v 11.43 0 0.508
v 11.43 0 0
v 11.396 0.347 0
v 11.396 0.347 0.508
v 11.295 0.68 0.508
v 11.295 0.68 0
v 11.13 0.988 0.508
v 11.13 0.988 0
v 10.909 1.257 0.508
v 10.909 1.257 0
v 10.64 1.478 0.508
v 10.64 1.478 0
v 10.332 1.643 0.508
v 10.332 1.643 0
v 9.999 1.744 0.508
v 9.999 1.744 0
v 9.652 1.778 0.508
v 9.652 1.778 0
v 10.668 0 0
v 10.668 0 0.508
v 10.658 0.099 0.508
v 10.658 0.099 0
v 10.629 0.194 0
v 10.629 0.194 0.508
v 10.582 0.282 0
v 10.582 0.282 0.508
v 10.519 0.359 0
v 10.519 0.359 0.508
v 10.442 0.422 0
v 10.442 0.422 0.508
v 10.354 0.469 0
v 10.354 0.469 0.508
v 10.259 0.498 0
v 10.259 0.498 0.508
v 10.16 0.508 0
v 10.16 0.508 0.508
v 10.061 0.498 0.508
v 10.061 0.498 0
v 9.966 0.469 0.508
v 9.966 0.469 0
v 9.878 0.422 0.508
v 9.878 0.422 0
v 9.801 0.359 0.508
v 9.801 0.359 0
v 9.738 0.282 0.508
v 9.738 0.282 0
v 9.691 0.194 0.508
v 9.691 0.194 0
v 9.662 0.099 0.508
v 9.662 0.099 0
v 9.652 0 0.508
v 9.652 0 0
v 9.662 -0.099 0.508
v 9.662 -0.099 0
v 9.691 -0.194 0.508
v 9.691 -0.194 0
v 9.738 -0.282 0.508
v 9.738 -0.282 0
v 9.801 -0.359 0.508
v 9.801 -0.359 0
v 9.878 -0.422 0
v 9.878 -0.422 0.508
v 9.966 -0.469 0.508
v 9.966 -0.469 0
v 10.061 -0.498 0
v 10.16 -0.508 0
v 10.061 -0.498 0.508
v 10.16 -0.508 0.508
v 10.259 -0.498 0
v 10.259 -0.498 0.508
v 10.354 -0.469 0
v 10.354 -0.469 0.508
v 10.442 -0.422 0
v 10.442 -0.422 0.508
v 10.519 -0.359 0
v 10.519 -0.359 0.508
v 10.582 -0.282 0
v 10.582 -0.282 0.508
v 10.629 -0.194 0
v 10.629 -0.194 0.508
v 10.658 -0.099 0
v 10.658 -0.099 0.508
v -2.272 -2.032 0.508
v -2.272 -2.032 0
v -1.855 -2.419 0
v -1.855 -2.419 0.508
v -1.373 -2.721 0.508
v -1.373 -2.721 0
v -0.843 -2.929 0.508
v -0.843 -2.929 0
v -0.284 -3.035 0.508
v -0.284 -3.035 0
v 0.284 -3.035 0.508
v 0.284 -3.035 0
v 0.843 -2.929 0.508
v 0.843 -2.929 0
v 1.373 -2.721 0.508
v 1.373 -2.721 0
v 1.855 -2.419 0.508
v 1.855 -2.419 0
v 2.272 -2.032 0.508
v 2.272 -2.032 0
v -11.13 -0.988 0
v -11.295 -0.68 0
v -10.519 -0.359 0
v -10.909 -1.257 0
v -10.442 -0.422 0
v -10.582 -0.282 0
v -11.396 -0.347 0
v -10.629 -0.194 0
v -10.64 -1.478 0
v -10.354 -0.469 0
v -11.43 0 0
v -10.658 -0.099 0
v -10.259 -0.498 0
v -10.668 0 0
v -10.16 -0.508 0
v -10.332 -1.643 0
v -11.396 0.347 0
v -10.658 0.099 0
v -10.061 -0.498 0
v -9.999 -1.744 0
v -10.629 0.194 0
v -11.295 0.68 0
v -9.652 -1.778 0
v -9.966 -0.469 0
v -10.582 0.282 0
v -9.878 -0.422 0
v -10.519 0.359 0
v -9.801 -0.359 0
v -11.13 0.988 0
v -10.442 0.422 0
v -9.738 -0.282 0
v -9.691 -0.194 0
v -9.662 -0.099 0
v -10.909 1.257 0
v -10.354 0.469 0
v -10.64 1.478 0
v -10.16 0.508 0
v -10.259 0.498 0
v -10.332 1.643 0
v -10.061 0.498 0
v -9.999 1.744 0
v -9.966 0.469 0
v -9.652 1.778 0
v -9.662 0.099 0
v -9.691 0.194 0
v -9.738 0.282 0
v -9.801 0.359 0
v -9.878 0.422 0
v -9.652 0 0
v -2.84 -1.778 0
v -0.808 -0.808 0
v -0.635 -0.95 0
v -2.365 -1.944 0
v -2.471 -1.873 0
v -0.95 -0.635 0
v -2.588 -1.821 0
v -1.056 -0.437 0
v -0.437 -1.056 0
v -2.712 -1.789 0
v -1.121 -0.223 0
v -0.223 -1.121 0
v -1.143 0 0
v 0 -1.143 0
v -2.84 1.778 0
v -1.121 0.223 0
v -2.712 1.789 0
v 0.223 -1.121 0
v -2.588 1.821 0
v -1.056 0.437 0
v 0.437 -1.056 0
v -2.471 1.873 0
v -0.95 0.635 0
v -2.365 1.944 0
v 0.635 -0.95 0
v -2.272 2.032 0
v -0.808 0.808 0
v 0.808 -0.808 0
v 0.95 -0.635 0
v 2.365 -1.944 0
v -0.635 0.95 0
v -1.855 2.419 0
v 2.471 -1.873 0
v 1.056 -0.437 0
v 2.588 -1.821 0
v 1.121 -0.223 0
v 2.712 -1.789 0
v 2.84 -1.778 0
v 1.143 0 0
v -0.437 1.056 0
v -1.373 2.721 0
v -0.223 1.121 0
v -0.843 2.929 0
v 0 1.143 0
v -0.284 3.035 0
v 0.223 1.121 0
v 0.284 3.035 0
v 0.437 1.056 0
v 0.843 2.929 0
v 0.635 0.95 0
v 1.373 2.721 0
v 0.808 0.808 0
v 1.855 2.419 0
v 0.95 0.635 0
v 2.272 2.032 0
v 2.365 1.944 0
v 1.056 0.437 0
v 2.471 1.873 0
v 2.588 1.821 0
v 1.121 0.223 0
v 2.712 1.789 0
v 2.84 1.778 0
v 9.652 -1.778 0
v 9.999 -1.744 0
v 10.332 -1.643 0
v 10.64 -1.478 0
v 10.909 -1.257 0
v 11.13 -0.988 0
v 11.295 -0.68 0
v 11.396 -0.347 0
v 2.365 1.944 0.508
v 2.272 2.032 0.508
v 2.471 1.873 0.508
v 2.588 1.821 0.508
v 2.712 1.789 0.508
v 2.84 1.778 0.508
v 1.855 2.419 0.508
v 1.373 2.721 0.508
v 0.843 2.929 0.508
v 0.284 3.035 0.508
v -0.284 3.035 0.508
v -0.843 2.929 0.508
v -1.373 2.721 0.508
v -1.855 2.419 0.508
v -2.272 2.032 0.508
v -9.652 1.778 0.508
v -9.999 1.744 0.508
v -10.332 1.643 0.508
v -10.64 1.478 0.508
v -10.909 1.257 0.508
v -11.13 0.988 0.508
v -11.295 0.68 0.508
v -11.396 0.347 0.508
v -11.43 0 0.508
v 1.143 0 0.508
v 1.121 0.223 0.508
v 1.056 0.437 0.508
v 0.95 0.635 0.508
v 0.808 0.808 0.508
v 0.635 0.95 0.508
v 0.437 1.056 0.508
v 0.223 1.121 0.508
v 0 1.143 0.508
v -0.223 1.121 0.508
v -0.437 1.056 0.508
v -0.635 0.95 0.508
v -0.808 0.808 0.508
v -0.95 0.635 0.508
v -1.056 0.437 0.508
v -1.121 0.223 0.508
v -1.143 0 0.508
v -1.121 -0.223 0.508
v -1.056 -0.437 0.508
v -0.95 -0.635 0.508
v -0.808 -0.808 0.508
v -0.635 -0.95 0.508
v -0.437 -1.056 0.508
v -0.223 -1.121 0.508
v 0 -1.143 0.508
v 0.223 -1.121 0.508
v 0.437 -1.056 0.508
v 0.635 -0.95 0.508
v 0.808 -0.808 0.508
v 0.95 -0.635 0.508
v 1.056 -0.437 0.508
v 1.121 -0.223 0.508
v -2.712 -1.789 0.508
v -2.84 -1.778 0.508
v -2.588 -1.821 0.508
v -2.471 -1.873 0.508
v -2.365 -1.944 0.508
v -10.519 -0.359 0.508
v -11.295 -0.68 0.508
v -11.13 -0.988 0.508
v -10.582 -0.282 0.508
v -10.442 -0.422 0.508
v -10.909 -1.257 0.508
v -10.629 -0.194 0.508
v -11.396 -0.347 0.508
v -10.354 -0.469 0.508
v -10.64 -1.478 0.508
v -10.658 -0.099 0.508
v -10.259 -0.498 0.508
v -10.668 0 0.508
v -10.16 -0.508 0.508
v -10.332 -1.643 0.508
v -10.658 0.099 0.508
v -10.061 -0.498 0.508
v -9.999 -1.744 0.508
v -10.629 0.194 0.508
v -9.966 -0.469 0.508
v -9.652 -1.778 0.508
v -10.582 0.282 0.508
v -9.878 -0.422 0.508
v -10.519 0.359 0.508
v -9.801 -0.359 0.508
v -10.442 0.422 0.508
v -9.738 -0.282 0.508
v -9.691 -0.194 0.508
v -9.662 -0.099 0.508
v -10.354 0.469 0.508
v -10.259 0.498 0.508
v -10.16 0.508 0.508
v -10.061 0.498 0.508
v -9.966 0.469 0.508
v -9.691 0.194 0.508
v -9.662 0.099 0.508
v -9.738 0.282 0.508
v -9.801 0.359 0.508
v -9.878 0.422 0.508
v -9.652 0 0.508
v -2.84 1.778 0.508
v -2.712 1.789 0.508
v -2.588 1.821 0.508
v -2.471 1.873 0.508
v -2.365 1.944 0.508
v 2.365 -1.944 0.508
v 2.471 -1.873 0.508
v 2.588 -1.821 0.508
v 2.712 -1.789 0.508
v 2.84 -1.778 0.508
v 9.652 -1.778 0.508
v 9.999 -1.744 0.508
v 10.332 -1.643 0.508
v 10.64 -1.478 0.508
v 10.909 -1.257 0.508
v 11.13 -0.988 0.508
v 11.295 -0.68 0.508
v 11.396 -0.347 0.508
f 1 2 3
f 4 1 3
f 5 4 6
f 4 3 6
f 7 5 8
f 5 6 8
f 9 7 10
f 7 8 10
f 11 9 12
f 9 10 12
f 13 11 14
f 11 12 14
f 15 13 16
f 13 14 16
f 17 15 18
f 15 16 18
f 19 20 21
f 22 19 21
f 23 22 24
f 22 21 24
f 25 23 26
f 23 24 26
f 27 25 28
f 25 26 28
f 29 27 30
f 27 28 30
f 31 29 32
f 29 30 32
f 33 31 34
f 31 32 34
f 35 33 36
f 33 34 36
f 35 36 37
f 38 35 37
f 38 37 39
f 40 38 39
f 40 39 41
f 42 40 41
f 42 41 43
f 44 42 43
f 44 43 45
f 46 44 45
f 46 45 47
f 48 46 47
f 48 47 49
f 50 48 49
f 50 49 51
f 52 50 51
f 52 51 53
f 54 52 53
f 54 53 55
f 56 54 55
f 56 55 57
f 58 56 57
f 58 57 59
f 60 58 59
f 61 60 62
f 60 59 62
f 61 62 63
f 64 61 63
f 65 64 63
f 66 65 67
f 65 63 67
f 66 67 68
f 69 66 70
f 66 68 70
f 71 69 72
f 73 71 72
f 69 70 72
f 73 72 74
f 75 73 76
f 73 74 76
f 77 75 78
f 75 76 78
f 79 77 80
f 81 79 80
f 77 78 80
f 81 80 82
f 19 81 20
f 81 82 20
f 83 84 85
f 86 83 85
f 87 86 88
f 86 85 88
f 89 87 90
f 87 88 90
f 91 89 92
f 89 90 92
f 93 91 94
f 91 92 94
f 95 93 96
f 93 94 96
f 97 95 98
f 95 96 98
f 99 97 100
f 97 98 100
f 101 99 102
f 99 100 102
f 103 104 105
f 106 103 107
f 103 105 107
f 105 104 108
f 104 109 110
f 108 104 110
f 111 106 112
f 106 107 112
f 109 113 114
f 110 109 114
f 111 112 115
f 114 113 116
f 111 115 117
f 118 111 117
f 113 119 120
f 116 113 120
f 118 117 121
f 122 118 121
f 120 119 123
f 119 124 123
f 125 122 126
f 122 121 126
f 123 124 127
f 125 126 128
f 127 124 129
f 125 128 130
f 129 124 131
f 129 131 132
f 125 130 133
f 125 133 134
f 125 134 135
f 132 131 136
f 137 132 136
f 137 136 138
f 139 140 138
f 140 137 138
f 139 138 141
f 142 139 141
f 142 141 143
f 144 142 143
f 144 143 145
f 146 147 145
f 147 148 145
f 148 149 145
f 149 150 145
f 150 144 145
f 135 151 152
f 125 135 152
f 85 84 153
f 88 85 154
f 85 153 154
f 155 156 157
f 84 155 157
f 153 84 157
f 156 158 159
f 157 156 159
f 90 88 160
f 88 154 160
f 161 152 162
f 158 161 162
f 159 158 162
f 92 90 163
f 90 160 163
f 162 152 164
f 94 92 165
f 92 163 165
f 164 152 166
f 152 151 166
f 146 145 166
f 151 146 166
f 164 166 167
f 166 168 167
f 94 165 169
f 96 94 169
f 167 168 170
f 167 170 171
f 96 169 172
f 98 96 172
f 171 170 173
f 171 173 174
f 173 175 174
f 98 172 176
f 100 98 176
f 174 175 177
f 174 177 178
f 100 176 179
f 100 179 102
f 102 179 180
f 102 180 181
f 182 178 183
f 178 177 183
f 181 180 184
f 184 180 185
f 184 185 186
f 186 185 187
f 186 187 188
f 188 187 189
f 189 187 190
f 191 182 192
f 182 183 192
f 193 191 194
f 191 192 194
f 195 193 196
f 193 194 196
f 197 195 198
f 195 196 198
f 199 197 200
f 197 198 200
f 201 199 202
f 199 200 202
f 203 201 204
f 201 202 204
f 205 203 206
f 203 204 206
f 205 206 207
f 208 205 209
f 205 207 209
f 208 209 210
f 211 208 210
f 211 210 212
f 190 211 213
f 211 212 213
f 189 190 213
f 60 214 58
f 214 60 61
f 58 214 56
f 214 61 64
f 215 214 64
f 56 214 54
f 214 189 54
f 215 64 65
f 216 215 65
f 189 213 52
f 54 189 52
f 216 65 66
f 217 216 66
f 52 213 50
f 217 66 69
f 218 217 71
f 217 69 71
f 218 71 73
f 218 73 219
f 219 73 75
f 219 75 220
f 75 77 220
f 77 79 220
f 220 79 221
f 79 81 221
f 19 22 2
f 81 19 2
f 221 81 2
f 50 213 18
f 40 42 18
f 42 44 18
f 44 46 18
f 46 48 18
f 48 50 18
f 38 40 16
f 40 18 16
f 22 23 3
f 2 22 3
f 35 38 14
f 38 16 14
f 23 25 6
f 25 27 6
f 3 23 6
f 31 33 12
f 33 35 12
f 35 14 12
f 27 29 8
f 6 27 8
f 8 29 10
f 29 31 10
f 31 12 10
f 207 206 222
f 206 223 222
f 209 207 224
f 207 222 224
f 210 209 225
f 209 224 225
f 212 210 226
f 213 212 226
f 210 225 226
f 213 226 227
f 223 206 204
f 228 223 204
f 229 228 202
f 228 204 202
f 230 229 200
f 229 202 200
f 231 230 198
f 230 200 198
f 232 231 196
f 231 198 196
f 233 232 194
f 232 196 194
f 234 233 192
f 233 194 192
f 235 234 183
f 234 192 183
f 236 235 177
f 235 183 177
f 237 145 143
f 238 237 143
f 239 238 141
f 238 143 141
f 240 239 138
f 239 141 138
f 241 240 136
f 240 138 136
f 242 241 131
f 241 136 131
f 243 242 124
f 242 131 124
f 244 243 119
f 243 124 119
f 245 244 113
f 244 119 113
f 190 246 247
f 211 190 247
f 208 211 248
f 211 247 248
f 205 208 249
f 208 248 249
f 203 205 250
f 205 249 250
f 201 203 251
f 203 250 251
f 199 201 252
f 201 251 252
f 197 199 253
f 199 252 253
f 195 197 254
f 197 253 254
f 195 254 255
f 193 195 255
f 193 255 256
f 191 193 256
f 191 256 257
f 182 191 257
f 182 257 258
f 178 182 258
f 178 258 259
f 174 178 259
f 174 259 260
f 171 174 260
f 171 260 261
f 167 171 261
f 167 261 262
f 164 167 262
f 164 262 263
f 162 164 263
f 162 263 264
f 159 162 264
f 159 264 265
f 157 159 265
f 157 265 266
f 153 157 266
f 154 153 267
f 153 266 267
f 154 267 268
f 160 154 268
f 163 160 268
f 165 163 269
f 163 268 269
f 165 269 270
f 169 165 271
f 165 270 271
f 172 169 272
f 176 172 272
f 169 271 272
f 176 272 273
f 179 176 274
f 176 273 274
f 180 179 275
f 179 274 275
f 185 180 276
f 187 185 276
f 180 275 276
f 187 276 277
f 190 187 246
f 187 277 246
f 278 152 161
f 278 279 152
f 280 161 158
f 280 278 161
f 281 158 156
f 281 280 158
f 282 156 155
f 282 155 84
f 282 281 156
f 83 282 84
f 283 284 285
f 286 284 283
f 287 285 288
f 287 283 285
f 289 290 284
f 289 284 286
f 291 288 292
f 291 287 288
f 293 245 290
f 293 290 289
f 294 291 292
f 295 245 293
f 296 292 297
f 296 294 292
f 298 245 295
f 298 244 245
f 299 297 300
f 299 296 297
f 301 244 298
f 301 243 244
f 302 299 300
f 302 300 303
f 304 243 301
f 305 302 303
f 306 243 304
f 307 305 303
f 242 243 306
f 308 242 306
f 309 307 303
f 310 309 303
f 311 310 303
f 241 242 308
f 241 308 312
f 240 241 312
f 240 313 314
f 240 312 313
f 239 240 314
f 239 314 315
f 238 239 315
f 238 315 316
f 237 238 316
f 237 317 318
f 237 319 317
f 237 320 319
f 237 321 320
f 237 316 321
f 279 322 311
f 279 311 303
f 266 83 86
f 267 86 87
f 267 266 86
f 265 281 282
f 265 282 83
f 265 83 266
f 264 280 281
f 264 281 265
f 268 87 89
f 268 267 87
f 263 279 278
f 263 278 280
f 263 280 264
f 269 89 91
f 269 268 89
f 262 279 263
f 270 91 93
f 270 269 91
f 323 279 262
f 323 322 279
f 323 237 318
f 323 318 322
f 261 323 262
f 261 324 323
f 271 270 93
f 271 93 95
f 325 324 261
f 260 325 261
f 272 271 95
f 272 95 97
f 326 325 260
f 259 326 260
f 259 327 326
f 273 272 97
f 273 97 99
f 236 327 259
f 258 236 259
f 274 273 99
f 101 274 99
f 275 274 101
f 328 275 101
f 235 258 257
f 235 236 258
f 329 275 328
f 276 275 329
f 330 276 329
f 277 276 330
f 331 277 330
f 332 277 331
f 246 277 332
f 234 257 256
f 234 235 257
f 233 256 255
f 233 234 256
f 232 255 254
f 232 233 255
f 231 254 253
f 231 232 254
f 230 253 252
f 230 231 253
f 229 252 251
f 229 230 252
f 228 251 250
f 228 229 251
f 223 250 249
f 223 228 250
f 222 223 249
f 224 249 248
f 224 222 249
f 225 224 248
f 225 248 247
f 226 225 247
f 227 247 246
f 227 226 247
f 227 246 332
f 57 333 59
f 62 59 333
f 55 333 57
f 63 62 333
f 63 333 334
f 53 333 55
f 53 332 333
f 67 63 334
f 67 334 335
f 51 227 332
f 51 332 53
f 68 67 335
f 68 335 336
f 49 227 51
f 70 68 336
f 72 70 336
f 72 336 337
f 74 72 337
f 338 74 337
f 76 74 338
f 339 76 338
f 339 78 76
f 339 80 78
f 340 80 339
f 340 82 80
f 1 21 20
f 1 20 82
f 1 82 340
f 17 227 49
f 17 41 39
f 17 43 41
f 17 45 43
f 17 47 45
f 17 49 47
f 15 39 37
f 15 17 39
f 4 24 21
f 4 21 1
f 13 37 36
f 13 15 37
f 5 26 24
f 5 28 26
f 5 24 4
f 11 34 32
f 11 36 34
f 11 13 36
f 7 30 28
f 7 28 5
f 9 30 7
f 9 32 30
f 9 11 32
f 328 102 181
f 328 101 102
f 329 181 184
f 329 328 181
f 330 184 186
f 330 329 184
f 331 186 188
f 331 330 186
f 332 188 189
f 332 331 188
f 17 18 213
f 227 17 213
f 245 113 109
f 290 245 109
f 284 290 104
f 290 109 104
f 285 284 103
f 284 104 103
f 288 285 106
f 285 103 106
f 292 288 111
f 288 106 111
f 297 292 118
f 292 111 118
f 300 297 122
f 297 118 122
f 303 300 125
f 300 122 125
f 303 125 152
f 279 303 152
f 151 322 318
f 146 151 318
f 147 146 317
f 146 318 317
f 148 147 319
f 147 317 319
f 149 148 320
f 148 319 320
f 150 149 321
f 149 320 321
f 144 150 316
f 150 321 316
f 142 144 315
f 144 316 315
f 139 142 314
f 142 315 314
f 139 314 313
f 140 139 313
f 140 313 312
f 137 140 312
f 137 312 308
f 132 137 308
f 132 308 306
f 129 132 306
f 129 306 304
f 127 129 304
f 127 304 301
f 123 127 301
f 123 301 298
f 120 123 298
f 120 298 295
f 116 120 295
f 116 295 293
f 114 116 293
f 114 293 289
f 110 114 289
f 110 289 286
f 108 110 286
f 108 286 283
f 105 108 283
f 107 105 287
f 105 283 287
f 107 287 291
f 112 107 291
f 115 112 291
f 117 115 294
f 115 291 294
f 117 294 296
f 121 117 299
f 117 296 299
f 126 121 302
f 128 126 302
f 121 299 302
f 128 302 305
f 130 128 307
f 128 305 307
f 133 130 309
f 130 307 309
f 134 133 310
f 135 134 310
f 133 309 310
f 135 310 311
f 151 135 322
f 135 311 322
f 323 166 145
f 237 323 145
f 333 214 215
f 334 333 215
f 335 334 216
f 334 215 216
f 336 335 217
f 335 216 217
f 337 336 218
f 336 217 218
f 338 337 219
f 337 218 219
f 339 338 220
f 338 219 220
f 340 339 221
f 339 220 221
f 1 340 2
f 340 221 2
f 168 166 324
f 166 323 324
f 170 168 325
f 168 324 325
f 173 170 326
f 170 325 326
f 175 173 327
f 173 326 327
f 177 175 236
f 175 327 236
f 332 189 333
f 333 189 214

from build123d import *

# Parameters (mm, degrees)
F1_DEPTH = 0.508
F2_R     = 0.508
F2_R_2   = 1.143
F3_DEPTH = 0.509
F4_R     = 0.762


with BuildPart() as f1:
    # F0 (on Top) → F1 (new body)
    with BuildSketch(Plane.XY):
        with BuildLine():
            Line((-2.475686, 1.778), (-9.652, 1.778))
            ThreePointArc((-9.652, 1.778), (-10.909236, 1.257236), (-11.43, 0))
            ThreePointArc((-11.43, 0), (-10.909236, -1.257236), (-9.652, -1.778))
            Line((-9.652, -1.778), (-2.475686, -1.778))
            ThreePointArc((-2.475686, -1.778), (0, -3.048), (2.475686, -1.778))
            Line((2.475686, -1.778), (9.652, -1.778))
            ThreePointArc((9.652, -1.778), (10.909236, -1.257236), (11.43, 0))
            ThreePointArc((11.43, 0), (10.909236, 1.257236), (9.652, 1.778))
            Line((9.652, 1.778), (2.475686, 1.778))
            ThreePointArc((2.475686, 1.778), (0, 3.048), (-2.475686, 1.778))
        make_face()
    extrude(amount=F1_DEPTH)

    # F2 (on face) → F3 (cut, through all)
    with BuildSketch(Plane.XY.offset(0.508)):
        with Locations((-10.16, 0)):
            Circle(F2_R)
        with Locations((10.16, 0)):
            Circle(F2_R)
        Circle(F2_R_2)
    extrude(amount=-F3_DEPTH, mode=Mode.SUBTRACT)

    # F4
    f4_edges = [f1.edges().sort_by_distance(p)[0] for p in [
        (-2.475686, -1.778, 0.254),
        (2.475686, -1.778, 0.254),
        (-2.475686, 1.778, 0.254),
        (2.475686, 1.778, 0.254),
    ]]
    fillet(f4_edges, radius=F4_R)


solid = f1.part
